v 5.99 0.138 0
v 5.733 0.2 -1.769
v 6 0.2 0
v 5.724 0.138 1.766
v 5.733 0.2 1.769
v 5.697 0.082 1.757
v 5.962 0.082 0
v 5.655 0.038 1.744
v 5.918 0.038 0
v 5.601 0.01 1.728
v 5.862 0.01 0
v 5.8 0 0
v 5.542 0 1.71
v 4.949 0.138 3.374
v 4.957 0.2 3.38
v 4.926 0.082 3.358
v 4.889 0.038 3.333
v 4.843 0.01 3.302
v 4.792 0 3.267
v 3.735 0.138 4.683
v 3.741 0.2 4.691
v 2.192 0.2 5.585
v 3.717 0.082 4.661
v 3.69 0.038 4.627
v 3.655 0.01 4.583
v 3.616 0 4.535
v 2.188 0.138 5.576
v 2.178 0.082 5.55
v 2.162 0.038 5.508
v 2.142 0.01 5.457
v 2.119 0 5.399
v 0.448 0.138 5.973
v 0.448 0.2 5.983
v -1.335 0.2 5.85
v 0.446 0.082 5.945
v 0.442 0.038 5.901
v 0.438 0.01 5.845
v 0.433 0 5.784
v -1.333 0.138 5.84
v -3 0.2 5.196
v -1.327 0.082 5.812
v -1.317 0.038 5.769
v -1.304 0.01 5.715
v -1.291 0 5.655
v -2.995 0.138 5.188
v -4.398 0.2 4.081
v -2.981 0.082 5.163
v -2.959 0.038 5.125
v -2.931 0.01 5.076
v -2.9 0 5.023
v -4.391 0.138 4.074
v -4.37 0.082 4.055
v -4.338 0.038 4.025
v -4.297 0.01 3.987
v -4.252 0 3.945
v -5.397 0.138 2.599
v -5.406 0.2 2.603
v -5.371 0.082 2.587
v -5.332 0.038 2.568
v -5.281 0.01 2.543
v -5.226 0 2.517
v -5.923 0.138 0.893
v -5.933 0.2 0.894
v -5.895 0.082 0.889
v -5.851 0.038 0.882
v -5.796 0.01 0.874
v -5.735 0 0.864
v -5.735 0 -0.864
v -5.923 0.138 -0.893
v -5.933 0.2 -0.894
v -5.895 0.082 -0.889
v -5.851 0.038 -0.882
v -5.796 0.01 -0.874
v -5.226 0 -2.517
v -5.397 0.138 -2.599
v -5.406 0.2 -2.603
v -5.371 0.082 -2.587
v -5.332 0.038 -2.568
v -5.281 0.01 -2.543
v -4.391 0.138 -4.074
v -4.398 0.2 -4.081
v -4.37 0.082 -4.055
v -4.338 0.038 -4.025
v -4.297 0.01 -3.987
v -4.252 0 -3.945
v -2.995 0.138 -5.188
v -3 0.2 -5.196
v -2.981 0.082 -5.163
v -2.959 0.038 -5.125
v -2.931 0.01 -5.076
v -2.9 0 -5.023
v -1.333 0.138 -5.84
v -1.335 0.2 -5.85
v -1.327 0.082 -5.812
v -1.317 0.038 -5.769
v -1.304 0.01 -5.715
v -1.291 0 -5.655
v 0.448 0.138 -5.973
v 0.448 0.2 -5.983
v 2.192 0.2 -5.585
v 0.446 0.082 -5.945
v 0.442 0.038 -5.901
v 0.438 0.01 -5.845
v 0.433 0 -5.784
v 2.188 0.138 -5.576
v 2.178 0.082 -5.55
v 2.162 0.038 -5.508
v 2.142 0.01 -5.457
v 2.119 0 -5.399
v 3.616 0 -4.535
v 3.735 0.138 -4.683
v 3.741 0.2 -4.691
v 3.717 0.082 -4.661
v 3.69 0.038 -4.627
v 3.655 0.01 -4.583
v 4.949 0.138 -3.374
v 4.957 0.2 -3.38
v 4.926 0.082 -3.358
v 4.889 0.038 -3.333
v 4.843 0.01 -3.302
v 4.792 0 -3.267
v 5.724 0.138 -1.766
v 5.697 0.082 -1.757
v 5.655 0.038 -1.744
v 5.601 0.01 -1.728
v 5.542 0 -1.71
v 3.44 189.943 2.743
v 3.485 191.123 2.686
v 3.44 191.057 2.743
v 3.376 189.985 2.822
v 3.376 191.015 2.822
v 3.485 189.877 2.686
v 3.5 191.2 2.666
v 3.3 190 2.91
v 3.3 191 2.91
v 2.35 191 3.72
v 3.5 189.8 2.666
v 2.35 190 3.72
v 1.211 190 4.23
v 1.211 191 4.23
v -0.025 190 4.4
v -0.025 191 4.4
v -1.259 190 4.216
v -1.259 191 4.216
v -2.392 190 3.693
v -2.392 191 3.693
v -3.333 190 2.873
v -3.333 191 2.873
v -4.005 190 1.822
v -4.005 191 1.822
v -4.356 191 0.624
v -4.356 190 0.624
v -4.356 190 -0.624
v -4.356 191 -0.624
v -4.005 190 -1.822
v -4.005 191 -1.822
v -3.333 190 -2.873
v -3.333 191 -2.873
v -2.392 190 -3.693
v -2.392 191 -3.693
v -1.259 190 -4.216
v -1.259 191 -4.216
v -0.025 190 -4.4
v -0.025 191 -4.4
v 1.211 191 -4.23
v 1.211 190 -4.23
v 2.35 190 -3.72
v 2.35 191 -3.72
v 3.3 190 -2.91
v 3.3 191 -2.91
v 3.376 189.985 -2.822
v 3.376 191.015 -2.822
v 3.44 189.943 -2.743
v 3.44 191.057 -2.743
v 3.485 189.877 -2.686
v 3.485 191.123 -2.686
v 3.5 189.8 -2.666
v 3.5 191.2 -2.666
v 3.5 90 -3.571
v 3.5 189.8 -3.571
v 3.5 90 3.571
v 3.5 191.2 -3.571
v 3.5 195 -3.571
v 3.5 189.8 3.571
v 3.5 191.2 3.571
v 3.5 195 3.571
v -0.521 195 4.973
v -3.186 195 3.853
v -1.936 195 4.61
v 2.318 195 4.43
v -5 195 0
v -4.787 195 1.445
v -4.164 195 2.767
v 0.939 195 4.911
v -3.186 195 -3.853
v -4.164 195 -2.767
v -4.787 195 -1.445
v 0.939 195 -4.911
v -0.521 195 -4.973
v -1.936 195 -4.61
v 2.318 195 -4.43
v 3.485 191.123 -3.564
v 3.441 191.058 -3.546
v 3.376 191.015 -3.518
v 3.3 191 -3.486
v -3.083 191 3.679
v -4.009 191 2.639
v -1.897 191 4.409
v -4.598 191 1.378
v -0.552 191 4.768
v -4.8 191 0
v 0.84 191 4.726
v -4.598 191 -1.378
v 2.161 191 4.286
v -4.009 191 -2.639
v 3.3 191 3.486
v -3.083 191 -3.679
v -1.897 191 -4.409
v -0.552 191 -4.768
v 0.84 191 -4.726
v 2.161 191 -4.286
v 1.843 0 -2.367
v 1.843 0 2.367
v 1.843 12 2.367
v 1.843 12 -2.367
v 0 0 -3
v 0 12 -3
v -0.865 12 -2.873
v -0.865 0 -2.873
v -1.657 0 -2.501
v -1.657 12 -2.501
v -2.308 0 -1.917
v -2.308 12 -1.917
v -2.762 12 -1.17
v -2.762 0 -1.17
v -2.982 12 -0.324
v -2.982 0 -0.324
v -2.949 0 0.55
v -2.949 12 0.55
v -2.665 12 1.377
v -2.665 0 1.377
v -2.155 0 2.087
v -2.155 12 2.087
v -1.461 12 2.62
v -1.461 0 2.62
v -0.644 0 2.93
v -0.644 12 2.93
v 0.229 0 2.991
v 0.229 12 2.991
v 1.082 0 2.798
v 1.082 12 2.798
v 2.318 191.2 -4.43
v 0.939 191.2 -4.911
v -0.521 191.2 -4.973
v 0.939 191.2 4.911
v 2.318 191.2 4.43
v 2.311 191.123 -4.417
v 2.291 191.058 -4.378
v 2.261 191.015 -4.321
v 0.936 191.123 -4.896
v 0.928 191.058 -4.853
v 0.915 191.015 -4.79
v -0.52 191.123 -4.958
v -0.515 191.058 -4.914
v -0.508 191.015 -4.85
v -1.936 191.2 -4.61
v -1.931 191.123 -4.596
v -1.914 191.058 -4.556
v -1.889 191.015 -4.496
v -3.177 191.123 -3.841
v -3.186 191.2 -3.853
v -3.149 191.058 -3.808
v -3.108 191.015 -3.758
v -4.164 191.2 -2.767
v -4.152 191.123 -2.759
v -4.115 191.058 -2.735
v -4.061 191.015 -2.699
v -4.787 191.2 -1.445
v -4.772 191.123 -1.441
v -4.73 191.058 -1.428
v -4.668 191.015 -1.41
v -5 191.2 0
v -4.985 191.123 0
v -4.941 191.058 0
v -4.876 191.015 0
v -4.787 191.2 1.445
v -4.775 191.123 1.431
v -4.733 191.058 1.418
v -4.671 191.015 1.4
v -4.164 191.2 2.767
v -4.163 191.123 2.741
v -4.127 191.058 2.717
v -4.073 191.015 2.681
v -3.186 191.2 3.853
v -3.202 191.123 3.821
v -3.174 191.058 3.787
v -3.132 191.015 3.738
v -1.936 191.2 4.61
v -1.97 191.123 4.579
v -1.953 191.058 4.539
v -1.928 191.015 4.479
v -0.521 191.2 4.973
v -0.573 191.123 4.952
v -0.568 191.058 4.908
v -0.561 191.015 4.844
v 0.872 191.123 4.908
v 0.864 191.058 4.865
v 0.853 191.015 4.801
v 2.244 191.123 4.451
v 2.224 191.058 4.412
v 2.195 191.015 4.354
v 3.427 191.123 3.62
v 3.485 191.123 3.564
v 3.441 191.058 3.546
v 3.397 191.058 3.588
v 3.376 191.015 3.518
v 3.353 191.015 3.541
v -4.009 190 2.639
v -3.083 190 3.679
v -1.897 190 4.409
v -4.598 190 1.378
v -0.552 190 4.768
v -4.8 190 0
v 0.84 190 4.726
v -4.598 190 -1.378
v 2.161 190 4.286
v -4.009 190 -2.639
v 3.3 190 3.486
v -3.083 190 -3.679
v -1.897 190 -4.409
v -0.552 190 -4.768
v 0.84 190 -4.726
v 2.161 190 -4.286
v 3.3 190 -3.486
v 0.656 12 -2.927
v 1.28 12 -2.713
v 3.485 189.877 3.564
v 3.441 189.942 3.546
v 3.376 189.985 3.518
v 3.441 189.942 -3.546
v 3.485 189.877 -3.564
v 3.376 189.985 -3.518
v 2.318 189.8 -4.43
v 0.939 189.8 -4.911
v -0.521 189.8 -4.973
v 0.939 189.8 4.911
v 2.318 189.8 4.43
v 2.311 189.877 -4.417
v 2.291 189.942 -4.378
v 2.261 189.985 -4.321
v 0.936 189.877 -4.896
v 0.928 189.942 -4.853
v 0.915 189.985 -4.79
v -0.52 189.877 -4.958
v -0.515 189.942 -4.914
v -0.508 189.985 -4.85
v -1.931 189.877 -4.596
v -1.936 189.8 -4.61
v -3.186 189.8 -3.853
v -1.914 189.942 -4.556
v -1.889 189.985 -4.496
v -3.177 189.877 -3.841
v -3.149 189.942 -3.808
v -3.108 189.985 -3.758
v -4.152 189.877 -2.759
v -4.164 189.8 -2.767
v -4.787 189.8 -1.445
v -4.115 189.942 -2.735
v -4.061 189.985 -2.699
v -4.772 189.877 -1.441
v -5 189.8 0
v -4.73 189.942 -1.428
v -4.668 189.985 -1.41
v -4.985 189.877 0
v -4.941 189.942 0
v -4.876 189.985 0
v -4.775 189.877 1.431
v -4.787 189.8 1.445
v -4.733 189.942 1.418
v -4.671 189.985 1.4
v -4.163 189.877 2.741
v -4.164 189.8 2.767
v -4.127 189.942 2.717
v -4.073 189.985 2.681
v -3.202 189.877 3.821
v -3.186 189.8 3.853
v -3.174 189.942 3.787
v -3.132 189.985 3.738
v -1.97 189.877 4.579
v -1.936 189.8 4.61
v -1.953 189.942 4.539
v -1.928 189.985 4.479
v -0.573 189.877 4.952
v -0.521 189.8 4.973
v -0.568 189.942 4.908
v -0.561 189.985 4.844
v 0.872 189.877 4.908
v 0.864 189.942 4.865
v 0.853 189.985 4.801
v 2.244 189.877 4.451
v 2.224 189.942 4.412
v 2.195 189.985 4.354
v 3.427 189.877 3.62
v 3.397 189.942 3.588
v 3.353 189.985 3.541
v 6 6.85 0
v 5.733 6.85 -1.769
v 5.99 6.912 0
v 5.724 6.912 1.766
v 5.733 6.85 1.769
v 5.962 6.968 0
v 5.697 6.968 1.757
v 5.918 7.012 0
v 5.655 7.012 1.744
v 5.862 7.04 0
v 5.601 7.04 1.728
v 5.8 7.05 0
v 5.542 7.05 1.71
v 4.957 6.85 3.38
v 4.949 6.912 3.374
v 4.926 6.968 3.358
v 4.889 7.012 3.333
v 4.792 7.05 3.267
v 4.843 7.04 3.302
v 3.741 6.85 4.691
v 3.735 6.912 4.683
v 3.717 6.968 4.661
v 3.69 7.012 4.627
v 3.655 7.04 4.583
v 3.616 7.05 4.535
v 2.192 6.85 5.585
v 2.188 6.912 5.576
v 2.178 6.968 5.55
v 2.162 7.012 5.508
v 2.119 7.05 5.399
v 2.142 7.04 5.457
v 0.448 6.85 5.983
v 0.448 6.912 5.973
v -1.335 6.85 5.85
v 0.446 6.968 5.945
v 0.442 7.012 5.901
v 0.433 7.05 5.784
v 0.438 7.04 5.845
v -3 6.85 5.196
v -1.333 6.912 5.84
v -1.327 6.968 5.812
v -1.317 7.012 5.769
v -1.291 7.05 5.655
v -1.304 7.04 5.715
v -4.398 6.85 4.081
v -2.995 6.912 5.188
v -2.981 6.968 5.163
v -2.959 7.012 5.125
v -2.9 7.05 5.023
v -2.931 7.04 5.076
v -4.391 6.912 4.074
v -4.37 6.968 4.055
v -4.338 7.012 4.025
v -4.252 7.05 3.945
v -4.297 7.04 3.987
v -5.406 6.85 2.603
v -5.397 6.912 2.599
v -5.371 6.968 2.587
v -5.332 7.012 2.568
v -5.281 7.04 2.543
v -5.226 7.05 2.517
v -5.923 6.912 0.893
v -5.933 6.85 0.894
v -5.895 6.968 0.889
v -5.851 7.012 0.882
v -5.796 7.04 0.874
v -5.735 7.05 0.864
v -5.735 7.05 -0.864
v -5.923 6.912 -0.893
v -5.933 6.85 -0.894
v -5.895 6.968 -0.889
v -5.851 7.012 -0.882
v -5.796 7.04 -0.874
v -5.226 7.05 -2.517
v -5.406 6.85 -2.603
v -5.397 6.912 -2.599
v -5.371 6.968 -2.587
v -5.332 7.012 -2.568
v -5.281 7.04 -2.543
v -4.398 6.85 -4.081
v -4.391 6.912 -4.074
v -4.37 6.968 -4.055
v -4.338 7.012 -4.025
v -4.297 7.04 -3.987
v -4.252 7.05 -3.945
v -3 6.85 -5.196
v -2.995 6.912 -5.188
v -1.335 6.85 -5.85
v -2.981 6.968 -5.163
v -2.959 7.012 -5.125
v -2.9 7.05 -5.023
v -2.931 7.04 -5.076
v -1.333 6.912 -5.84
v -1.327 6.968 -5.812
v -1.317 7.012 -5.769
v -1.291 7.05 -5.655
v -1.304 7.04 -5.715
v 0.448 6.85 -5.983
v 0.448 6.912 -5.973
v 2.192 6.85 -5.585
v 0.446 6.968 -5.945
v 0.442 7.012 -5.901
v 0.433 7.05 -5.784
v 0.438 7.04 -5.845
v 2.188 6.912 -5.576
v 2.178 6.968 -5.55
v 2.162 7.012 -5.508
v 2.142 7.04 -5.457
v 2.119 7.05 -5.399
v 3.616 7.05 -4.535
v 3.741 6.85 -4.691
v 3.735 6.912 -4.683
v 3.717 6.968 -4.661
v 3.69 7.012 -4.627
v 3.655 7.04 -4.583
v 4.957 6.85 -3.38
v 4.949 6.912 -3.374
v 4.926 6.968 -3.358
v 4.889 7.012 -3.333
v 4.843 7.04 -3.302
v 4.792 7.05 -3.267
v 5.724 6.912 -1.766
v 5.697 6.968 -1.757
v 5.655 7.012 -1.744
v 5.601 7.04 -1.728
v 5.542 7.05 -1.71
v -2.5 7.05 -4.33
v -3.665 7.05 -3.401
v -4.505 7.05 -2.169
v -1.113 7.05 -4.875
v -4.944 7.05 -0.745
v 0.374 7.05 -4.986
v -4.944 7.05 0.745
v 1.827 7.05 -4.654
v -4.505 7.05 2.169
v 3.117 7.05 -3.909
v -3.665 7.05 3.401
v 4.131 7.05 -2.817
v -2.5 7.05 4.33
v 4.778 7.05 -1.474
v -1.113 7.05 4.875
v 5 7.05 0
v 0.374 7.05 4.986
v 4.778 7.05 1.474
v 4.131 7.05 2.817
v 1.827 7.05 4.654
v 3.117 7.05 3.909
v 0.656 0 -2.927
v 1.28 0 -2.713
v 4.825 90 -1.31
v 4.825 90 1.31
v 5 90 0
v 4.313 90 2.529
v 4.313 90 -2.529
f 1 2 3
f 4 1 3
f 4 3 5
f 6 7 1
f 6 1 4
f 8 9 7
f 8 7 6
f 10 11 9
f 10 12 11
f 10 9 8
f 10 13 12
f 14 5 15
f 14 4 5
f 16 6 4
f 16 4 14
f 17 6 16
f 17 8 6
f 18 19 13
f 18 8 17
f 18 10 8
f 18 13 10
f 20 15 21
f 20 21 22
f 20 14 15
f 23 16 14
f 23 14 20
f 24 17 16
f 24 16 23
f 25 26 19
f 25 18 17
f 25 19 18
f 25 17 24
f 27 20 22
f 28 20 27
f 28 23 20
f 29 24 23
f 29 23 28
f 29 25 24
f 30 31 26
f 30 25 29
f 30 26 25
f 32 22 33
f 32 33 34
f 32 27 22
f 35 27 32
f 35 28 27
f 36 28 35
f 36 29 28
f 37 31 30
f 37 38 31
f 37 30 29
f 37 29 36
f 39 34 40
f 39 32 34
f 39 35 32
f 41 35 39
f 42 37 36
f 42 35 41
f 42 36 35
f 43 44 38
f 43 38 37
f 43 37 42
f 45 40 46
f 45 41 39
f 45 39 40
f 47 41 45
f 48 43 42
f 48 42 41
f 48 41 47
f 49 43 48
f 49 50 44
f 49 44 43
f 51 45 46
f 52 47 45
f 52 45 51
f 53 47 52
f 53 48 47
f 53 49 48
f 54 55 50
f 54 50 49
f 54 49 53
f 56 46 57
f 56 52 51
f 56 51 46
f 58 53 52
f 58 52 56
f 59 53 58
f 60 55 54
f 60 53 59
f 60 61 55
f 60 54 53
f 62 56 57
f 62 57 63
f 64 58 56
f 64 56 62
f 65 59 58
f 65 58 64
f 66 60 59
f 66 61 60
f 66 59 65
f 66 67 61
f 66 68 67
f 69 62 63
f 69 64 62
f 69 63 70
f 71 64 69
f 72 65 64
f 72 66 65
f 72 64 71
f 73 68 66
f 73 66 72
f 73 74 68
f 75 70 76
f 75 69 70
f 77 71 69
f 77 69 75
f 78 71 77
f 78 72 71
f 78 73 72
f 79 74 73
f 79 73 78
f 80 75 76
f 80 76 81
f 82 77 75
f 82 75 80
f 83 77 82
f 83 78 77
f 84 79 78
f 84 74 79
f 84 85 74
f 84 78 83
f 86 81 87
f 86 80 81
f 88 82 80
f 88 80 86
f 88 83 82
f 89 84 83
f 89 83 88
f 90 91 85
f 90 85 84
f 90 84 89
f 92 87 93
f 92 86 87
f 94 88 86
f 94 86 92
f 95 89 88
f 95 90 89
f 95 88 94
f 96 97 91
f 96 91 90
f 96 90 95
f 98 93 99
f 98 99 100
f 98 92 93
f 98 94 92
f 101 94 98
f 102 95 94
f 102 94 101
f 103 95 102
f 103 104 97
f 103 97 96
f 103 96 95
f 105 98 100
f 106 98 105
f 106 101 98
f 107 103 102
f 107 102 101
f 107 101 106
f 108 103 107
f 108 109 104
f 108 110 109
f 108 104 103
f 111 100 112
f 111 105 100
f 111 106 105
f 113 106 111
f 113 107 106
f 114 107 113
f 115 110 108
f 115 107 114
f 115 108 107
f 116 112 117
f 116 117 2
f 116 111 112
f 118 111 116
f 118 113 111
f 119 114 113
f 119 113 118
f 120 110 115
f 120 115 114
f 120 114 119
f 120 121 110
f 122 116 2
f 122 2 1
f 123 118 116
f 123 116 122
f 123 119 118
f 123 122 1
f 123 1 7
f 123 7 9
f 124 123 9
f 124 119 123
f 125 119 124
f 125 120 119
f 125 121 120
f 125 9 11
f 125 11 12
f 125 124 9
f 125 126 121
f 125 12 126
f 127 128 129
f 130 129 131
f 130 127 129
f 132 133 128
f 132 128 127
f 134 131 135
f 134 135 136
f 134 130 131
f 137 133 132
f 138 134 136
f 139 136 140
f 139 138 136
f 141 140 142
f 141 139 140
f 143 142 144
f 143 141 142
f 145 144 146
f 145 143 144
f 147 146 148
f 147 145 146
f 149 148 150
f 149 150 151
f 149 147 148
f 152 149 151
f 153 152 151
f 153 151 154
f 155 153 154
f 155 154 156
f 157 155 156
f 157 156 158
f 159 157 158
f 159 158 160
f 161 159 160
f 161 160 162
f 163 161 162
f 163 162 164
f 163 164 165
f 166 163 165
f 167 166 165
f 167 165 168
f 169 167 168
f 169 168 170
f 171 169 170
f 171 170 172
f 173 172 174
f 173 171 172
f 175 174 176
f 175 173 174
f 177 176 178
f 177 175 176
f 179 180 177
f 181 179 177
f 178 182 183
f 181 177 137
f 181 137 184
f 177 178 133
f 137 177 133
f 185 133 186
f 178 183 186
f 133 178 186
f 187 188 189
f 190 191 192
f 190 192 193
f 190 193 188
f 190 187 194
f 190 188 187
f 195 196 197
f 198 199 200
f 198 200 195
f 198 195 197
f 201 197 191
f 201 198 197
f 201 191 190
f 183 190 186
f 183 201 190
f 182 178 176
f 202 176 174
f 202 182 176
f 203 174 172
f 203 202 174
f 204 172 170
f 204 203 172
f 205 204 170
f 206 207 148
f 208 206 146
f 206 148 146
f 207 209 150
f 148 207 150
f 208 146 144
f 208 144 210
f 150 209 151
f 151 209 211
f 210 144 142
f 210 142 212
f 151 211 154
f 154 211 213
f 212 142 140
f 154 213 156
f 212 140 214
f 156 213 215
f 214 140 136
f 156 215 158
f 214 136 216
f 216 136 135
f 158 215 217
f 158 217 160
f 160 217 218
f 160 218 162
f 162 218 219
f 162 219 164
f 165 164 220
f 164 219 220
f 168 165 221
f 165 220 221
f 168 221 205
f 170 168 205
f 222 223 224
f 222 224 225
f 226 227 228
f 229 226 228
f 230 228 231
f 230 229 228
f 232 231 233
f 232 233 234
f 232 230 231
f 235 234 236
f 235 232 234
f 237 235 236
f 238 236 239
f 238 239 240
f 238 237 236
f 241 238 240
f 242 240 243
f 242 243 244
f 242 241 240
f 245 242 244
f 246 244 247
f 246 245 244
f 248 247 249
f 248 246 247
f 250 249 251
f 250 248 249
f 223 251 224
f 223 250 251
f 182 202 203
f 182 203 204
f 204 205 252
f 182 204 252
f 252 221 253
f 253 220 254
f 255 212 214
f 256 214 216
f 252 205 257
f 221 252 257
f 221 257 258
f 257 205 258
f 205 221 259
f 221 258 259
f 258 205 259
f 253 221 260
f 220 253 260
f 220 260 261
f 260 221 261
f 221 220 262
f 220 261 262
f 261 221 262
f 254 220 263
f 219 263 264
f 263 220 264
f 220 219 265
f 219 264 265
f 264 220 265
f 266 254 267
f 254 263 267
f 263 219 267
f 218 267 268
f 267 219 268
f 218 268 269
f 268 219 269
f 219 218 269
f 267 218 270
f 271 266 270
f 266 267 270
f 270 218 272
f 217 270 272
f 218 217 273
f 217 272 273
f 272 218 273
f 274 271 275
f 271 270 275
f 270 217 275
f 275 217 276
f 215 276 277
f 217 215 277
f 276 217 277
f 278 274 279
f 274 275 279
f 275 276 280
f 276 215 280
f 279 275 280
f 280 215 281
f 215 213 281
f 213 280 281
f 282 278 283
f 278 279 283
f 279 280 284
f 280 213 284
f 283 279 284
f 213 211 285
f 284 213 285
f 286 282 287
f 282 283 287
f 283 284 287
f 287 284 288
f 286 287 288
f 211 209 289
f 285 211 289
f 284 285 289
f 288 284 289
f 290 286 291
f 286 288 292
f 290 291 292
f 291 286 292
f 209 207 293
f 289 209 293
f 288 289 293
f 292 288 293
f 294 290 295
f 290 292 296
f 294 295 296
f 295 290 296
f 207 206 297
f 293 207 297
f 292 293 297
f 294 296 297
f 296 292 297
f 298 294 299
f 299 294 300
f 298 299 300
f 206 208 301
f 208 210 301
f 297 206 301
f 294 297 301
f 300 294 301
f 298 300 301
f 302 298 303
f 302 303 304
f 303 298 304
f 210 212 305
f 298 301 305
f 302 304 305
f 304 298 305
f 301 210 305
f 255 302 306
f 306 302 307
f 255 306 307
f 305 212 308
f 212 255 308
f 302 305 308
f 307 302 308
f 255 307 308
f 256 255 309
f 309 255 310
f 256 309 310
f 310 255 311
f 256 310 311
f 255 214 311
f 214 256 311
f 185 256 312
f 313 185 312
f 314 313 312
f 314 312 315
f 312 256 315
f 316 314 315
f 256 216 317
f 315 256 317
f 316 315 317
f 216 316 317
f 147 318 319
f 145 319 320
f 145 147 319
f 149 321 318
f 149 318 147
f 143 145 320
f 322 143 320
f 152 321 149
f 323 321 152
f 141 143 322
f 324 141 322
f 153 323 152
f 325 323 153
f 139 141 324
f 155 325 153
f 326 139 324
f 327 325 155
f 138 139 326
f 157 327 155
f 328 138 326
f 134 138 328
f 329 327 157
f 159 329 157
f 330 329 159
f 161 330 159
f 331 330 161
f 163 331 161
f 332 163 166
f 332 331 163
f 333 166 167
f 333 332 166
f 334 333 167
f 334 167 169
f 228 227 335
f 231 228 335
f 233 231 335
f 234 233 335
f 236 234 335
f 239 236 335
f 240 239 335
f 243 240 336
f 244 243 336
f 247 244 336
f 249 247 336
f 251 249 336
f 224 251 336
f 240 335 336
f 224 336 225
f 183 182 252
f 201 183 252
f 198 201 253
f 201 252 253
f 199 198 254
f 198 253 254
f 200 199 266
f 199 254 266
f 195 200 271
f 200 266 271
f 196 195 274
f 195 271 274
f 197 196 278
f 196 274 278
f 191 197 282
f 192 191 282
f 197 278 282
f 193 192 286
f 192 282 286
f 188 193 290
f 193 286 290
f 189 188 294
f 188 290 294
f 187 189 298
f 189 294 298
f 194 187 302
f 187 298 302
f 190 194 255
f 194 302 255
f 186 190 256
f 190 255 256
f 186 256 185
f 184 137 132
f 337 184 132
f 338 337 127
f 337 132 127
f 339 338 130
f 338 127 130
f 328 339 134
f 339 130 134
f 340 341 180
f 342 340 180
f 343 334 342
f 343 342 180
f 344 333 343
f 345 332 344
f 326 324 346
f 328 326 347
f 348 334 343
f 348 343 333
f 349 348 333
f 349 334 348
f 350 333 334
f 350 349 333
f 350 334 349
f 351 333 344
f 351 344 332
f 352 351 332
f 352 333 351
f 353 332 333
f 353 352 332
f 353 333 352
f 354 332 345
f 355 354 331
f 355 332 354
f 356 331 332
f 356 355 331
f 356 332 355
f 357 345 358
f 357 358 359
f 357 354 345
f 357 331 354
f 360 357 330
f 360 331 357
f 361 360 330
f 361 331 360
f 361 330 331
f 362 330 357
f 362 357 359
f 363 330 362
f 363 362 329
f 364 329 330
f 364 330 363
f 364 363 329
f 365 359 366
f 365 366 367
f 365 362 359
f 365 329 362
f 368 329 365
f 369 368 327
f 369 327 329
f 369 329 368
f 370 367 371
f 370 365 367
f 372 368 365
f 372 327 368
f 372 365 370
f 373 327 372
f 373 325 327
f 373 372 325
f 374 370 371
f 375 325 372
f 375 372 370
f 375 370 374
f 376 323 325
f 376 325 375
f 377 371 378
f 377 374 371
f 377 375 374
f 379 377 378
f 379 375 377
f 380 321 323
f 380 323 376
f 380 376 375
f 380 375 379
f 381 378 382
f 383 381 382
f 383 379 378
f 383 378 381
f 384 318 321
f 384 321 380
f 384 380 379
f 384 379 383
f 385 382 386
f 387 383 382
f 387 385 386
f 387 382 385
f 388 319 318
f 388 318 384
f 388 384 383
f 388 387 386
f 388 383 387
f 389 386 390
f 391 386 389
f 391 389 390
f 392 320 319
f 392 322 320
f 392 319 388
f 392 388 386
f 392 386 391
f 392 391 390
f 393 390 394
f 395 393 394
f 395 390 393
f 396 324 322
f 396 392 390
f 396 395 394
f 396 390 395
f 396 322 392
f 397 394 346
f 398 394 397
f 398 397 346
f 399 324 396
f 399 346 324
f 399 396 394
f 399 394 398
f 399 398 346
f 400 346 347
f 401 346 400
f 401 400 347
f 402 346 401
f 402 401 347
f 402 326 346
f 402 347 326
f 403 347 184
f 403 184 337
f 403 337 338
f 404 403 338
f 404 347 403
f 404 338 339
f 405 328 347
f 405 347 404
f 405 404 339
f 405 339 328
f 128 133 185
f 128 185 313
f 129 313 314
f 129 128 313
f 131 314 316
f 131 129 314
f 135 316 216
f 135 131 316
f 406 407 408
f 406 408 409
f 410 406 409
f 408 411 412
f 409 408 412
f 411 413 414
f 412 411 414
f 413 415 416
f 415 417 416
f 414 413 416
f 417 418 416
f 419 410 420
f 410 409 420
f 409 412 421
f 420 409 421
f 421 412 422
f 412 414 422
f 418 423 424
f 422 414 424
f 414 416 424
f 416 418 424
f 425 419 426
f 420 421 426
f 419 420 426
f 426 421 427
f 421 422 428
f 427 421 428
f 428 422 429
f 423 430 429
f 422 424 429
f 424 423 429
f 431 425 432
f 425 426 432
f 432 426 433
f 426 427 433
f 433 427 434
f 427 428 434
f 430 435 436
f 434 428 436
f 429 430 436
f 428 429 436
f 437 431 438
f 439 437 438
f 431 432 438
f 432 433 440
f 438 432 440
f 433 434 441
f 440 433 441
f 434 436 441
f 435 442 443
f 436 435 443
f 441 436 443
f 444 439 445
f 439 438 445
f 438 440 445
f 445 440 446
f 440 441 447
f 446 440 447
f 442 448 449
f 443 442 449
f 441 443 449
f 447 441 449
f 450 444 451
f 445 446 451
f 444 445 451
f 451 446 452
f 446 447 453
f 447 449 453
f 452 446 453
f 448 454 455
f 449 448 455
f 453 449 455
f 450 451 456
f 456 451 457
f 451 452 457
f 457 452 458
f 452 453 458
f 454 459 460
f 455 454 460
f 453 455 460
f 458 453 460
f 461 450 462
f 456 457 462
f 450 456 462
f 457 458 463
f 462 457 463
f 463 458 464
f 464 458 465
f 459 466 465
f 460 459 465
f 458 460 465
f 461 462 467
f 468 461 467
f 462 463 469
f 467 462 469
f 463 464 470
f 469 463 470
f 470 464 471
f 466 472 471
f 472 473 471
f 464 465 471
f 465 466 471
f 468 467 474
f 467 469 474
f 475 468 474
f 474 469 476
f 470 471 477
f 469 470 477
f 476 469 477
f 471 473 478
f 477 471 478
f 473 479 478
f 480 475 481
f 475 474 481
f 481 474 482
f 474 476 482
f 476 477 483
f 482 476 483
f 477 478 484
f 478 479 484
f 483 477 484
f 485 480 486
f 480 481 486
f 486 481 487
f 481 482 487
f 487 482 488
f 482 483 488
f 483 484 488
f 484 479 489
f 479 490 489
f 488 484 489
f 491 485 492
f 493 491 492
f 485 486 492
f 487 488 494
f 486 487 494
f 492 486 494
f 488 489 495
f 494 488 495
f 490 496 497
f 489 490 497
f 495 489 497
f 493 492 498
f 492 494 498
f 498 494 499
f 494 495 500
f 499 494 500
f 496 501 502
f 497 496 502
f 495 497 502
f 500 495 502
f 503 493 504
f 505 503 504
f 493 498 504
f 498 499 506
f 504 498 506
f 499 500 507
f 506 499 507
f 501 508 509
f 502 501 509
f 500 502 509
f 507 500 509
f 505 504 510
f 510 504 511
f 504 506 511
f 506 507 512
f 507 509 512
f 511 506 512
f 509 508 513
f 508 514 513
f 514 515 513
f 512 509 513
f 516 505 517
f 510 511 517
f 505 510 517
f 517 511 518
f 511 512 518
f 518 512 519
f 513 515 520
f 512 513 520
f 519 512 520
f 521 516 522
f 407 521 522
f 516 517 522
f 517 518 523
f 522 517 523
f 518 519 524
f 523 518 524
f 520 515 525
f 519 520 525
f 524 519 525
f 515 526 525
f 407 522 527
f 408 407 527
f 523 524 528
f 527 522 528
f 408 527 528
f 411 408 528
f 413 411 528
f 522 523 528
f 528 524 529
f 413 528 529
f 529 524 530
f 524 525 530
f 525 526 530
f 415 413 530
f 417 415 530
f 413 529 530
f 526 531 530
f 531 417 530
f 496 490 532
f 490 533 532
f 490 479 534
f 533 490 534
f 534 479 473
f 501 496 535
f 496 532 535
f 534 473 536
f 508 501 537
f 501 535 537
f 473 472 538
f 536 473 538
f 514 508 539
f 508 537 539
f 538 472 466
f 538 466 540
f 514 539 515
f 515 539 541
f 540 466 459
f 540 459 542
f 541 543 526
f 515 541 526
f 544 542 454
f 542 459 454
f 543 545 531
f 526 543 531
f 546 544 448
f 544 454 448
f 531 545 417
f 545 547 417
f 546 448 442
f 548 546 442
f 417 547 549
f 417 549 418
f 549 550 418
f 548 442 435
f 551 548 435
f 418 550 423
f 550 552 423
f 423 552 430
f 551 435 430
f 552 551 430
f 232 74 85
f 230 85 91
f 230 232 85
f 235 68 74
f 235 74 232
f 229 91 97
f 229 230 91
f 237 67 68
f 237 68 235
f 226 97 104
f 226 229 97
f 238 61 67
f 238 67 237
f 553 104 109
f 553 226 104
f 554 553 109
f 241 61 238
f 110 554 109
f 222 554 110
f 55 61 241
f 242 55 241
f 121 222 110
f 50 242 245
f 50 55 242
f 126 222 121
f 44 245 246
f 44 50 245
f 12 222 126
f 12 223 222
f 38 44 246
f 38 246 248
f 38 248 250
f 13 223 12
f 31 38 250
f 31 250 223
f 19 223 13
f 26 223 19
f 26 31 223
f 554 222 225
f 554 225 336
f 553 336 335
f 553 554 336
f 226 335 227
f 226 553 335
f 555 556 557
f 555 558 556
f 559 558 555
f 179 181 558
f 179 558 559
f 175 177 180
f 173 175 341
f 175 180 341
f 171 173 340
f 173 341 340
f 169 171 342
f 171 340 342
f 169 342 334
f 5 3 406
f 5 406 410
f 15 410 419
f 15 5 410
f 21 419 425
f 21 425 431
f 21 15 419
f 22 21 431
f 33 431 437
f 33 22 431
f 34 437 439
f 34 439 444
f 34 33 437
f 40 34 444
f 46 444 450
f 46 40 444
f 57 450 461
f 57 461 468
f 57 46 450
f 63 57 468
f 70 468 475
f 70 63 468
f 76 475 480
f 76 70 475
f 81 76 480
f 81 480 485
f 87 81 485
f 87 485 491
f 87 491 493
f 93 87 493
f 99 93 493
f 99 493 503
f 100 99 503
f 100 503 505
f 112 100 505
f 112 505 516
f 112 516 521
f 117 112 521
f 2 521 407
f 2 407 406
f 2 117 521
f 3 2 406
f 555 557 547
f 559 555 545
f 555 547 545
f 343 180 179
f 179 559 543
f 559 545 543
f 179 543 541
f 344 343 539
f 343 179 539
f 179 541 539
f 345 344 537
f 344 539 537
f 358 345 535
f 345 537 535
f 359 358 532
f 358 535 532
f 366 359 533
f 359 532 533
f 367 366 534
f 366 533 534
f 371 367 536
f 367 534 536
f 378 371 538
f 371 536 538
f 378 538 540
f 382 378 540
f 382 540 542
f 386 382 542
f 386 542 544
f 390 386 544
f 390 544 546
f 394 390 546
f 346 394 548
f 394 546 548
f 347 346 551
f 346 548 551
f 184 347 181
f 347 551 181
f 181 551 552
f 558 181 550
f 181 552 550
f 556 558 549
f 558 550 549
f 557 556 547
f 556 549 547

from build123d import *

# Parameters (mm, degrees)
SKETCH1_R           = 5
BOSS_EXTRUDE1_DEPTH = 195
CUT_EXTRUDE1_DEPTH  = 12
CUT_EXTRUDE2_START  = -105
CUT_EXTRUDE2_DEPTH  = 105
CUT_EXTRUDE3_START  = -5
CUT_EXTRUDE3_DEPTH  = 1
FILLET1_R           = 0.2
SKETCH5_R           = 6
SKETCH5_R_2         = 5
BOSS_EXTRUDE2_DEPTH = 7.05
FILLET2_R           = 0.2


with BuildPart() as part:
    # Sketch1 → Boss-Extrude1 (new body)
    with BuildSketch(Plane(origin=(0, 0, 0), x_dir=(1, 0, 0), z_dir=(0, 1, 0))):
        Circle(SKETCH1_R)
    extrude(amount=BOSS_EXTRUDE1_DEPTH)

    # Sketch1<3> → Cut-Extrude1 (cut)
    with BuildSketch(Plane(origin=(0, 0, 0), x_dir=(1, 0, 0), z_dir=(0, 1, 0))):
        with BuildLine():
            Line((1.842665061, -2.367400573), (1.842665061, 2.367400573))
            ThreePointArc((1.842665061, 2.367400573), (0.974114542, 2.837446186), (0, 3))
            ThreePointArc((0, 3), (-2.837446186, -0.974114542), (1.842665061, -2.367400573))
        make_face()
    extrude(amount=CUT_EXTRUDE1_DEPTH, mode=Mode.SUBTRACT)

    # Sketch3 → Cut-Extrude2 (cut)
    with BuildSketch(Plane(origin=(0, 195, 0), x_dir=(1, 0, 0), z_dir=(0, 1, 0)).offset(CUT_EXTRUDE2_START)):
        with BuildLine():
            ThreePointArc((5, 0), (4.609772229, 1.936491673), (3.5, 3.570714214))
            Line((3.5, 3.570714214), (3.5, -3.570714214))
            ThreePointArc((3.5, -3.570714214), (4.609772229, -1.936491673), (5, 0))
        make_face()
    extrude(amount=CUT_EXTRUDE2_DEPTH, mode=Mode.SUBTRACT)

    # Sketch4 → Cut-Extrude3 (cut)
    with BuildSketch(Plane(origin=(0, 195, 0), x_dir=(1, 0, 0), z_dir=(0, 1, 0)).offset(CUT_EXTRUDE3_START)):
        with BuildLine():
            Line((3.5, 2.666458325), (3.5, 3.570714214))
            ThreePointArc((3.5, 3.570714214), (-5, 0), (3.5, -3.570714214))
            Line((3.5, -3.570714214), (3.5, -2.666458325))
            ThreePointArc((3.5, -2.666458325), (-4.4, 0), (3.5, 2.666458325))
        make_face()
    extrude(amount=CUT_EXTRUDE3_DEPTH, mode=Mode.SUBTRACT)

    # Fillet1
    fillet1_edges = [part.edges().sort_by_distance(p)[0] for p in [
        (3.5, 191, 3.11858627),
        (3.5, 190, 3.11858627),
        (3.5, 191, -3.11858627),
        (3.5, 190, -3.11858627),
        (-5, 191, 0),
        (-5, 190, 0),
    ]]
    fillet(fillet1_edges, radius=FILLET1_R)

    # Sketch5 → Boss-Extrude2 (add)
    with BuildSketch(Plane.XZ):
        Circle(SKETCH5_R)
        Circle(SKETCH5_R_2, mode=Mode.SUBTRACT)
    extrude(amount=-BOSS_EXTRUDE2_DEPTH)

    # Fillet2
    fillet2_edges = [part.edges().sort_by_distance(p)[0] for p in [
        (-6, 7.05, 0),
        (-6, 0, 0),
    ]]
    fillet(fillet2_edges, radius=FILLET2_R)


solid = part.part
